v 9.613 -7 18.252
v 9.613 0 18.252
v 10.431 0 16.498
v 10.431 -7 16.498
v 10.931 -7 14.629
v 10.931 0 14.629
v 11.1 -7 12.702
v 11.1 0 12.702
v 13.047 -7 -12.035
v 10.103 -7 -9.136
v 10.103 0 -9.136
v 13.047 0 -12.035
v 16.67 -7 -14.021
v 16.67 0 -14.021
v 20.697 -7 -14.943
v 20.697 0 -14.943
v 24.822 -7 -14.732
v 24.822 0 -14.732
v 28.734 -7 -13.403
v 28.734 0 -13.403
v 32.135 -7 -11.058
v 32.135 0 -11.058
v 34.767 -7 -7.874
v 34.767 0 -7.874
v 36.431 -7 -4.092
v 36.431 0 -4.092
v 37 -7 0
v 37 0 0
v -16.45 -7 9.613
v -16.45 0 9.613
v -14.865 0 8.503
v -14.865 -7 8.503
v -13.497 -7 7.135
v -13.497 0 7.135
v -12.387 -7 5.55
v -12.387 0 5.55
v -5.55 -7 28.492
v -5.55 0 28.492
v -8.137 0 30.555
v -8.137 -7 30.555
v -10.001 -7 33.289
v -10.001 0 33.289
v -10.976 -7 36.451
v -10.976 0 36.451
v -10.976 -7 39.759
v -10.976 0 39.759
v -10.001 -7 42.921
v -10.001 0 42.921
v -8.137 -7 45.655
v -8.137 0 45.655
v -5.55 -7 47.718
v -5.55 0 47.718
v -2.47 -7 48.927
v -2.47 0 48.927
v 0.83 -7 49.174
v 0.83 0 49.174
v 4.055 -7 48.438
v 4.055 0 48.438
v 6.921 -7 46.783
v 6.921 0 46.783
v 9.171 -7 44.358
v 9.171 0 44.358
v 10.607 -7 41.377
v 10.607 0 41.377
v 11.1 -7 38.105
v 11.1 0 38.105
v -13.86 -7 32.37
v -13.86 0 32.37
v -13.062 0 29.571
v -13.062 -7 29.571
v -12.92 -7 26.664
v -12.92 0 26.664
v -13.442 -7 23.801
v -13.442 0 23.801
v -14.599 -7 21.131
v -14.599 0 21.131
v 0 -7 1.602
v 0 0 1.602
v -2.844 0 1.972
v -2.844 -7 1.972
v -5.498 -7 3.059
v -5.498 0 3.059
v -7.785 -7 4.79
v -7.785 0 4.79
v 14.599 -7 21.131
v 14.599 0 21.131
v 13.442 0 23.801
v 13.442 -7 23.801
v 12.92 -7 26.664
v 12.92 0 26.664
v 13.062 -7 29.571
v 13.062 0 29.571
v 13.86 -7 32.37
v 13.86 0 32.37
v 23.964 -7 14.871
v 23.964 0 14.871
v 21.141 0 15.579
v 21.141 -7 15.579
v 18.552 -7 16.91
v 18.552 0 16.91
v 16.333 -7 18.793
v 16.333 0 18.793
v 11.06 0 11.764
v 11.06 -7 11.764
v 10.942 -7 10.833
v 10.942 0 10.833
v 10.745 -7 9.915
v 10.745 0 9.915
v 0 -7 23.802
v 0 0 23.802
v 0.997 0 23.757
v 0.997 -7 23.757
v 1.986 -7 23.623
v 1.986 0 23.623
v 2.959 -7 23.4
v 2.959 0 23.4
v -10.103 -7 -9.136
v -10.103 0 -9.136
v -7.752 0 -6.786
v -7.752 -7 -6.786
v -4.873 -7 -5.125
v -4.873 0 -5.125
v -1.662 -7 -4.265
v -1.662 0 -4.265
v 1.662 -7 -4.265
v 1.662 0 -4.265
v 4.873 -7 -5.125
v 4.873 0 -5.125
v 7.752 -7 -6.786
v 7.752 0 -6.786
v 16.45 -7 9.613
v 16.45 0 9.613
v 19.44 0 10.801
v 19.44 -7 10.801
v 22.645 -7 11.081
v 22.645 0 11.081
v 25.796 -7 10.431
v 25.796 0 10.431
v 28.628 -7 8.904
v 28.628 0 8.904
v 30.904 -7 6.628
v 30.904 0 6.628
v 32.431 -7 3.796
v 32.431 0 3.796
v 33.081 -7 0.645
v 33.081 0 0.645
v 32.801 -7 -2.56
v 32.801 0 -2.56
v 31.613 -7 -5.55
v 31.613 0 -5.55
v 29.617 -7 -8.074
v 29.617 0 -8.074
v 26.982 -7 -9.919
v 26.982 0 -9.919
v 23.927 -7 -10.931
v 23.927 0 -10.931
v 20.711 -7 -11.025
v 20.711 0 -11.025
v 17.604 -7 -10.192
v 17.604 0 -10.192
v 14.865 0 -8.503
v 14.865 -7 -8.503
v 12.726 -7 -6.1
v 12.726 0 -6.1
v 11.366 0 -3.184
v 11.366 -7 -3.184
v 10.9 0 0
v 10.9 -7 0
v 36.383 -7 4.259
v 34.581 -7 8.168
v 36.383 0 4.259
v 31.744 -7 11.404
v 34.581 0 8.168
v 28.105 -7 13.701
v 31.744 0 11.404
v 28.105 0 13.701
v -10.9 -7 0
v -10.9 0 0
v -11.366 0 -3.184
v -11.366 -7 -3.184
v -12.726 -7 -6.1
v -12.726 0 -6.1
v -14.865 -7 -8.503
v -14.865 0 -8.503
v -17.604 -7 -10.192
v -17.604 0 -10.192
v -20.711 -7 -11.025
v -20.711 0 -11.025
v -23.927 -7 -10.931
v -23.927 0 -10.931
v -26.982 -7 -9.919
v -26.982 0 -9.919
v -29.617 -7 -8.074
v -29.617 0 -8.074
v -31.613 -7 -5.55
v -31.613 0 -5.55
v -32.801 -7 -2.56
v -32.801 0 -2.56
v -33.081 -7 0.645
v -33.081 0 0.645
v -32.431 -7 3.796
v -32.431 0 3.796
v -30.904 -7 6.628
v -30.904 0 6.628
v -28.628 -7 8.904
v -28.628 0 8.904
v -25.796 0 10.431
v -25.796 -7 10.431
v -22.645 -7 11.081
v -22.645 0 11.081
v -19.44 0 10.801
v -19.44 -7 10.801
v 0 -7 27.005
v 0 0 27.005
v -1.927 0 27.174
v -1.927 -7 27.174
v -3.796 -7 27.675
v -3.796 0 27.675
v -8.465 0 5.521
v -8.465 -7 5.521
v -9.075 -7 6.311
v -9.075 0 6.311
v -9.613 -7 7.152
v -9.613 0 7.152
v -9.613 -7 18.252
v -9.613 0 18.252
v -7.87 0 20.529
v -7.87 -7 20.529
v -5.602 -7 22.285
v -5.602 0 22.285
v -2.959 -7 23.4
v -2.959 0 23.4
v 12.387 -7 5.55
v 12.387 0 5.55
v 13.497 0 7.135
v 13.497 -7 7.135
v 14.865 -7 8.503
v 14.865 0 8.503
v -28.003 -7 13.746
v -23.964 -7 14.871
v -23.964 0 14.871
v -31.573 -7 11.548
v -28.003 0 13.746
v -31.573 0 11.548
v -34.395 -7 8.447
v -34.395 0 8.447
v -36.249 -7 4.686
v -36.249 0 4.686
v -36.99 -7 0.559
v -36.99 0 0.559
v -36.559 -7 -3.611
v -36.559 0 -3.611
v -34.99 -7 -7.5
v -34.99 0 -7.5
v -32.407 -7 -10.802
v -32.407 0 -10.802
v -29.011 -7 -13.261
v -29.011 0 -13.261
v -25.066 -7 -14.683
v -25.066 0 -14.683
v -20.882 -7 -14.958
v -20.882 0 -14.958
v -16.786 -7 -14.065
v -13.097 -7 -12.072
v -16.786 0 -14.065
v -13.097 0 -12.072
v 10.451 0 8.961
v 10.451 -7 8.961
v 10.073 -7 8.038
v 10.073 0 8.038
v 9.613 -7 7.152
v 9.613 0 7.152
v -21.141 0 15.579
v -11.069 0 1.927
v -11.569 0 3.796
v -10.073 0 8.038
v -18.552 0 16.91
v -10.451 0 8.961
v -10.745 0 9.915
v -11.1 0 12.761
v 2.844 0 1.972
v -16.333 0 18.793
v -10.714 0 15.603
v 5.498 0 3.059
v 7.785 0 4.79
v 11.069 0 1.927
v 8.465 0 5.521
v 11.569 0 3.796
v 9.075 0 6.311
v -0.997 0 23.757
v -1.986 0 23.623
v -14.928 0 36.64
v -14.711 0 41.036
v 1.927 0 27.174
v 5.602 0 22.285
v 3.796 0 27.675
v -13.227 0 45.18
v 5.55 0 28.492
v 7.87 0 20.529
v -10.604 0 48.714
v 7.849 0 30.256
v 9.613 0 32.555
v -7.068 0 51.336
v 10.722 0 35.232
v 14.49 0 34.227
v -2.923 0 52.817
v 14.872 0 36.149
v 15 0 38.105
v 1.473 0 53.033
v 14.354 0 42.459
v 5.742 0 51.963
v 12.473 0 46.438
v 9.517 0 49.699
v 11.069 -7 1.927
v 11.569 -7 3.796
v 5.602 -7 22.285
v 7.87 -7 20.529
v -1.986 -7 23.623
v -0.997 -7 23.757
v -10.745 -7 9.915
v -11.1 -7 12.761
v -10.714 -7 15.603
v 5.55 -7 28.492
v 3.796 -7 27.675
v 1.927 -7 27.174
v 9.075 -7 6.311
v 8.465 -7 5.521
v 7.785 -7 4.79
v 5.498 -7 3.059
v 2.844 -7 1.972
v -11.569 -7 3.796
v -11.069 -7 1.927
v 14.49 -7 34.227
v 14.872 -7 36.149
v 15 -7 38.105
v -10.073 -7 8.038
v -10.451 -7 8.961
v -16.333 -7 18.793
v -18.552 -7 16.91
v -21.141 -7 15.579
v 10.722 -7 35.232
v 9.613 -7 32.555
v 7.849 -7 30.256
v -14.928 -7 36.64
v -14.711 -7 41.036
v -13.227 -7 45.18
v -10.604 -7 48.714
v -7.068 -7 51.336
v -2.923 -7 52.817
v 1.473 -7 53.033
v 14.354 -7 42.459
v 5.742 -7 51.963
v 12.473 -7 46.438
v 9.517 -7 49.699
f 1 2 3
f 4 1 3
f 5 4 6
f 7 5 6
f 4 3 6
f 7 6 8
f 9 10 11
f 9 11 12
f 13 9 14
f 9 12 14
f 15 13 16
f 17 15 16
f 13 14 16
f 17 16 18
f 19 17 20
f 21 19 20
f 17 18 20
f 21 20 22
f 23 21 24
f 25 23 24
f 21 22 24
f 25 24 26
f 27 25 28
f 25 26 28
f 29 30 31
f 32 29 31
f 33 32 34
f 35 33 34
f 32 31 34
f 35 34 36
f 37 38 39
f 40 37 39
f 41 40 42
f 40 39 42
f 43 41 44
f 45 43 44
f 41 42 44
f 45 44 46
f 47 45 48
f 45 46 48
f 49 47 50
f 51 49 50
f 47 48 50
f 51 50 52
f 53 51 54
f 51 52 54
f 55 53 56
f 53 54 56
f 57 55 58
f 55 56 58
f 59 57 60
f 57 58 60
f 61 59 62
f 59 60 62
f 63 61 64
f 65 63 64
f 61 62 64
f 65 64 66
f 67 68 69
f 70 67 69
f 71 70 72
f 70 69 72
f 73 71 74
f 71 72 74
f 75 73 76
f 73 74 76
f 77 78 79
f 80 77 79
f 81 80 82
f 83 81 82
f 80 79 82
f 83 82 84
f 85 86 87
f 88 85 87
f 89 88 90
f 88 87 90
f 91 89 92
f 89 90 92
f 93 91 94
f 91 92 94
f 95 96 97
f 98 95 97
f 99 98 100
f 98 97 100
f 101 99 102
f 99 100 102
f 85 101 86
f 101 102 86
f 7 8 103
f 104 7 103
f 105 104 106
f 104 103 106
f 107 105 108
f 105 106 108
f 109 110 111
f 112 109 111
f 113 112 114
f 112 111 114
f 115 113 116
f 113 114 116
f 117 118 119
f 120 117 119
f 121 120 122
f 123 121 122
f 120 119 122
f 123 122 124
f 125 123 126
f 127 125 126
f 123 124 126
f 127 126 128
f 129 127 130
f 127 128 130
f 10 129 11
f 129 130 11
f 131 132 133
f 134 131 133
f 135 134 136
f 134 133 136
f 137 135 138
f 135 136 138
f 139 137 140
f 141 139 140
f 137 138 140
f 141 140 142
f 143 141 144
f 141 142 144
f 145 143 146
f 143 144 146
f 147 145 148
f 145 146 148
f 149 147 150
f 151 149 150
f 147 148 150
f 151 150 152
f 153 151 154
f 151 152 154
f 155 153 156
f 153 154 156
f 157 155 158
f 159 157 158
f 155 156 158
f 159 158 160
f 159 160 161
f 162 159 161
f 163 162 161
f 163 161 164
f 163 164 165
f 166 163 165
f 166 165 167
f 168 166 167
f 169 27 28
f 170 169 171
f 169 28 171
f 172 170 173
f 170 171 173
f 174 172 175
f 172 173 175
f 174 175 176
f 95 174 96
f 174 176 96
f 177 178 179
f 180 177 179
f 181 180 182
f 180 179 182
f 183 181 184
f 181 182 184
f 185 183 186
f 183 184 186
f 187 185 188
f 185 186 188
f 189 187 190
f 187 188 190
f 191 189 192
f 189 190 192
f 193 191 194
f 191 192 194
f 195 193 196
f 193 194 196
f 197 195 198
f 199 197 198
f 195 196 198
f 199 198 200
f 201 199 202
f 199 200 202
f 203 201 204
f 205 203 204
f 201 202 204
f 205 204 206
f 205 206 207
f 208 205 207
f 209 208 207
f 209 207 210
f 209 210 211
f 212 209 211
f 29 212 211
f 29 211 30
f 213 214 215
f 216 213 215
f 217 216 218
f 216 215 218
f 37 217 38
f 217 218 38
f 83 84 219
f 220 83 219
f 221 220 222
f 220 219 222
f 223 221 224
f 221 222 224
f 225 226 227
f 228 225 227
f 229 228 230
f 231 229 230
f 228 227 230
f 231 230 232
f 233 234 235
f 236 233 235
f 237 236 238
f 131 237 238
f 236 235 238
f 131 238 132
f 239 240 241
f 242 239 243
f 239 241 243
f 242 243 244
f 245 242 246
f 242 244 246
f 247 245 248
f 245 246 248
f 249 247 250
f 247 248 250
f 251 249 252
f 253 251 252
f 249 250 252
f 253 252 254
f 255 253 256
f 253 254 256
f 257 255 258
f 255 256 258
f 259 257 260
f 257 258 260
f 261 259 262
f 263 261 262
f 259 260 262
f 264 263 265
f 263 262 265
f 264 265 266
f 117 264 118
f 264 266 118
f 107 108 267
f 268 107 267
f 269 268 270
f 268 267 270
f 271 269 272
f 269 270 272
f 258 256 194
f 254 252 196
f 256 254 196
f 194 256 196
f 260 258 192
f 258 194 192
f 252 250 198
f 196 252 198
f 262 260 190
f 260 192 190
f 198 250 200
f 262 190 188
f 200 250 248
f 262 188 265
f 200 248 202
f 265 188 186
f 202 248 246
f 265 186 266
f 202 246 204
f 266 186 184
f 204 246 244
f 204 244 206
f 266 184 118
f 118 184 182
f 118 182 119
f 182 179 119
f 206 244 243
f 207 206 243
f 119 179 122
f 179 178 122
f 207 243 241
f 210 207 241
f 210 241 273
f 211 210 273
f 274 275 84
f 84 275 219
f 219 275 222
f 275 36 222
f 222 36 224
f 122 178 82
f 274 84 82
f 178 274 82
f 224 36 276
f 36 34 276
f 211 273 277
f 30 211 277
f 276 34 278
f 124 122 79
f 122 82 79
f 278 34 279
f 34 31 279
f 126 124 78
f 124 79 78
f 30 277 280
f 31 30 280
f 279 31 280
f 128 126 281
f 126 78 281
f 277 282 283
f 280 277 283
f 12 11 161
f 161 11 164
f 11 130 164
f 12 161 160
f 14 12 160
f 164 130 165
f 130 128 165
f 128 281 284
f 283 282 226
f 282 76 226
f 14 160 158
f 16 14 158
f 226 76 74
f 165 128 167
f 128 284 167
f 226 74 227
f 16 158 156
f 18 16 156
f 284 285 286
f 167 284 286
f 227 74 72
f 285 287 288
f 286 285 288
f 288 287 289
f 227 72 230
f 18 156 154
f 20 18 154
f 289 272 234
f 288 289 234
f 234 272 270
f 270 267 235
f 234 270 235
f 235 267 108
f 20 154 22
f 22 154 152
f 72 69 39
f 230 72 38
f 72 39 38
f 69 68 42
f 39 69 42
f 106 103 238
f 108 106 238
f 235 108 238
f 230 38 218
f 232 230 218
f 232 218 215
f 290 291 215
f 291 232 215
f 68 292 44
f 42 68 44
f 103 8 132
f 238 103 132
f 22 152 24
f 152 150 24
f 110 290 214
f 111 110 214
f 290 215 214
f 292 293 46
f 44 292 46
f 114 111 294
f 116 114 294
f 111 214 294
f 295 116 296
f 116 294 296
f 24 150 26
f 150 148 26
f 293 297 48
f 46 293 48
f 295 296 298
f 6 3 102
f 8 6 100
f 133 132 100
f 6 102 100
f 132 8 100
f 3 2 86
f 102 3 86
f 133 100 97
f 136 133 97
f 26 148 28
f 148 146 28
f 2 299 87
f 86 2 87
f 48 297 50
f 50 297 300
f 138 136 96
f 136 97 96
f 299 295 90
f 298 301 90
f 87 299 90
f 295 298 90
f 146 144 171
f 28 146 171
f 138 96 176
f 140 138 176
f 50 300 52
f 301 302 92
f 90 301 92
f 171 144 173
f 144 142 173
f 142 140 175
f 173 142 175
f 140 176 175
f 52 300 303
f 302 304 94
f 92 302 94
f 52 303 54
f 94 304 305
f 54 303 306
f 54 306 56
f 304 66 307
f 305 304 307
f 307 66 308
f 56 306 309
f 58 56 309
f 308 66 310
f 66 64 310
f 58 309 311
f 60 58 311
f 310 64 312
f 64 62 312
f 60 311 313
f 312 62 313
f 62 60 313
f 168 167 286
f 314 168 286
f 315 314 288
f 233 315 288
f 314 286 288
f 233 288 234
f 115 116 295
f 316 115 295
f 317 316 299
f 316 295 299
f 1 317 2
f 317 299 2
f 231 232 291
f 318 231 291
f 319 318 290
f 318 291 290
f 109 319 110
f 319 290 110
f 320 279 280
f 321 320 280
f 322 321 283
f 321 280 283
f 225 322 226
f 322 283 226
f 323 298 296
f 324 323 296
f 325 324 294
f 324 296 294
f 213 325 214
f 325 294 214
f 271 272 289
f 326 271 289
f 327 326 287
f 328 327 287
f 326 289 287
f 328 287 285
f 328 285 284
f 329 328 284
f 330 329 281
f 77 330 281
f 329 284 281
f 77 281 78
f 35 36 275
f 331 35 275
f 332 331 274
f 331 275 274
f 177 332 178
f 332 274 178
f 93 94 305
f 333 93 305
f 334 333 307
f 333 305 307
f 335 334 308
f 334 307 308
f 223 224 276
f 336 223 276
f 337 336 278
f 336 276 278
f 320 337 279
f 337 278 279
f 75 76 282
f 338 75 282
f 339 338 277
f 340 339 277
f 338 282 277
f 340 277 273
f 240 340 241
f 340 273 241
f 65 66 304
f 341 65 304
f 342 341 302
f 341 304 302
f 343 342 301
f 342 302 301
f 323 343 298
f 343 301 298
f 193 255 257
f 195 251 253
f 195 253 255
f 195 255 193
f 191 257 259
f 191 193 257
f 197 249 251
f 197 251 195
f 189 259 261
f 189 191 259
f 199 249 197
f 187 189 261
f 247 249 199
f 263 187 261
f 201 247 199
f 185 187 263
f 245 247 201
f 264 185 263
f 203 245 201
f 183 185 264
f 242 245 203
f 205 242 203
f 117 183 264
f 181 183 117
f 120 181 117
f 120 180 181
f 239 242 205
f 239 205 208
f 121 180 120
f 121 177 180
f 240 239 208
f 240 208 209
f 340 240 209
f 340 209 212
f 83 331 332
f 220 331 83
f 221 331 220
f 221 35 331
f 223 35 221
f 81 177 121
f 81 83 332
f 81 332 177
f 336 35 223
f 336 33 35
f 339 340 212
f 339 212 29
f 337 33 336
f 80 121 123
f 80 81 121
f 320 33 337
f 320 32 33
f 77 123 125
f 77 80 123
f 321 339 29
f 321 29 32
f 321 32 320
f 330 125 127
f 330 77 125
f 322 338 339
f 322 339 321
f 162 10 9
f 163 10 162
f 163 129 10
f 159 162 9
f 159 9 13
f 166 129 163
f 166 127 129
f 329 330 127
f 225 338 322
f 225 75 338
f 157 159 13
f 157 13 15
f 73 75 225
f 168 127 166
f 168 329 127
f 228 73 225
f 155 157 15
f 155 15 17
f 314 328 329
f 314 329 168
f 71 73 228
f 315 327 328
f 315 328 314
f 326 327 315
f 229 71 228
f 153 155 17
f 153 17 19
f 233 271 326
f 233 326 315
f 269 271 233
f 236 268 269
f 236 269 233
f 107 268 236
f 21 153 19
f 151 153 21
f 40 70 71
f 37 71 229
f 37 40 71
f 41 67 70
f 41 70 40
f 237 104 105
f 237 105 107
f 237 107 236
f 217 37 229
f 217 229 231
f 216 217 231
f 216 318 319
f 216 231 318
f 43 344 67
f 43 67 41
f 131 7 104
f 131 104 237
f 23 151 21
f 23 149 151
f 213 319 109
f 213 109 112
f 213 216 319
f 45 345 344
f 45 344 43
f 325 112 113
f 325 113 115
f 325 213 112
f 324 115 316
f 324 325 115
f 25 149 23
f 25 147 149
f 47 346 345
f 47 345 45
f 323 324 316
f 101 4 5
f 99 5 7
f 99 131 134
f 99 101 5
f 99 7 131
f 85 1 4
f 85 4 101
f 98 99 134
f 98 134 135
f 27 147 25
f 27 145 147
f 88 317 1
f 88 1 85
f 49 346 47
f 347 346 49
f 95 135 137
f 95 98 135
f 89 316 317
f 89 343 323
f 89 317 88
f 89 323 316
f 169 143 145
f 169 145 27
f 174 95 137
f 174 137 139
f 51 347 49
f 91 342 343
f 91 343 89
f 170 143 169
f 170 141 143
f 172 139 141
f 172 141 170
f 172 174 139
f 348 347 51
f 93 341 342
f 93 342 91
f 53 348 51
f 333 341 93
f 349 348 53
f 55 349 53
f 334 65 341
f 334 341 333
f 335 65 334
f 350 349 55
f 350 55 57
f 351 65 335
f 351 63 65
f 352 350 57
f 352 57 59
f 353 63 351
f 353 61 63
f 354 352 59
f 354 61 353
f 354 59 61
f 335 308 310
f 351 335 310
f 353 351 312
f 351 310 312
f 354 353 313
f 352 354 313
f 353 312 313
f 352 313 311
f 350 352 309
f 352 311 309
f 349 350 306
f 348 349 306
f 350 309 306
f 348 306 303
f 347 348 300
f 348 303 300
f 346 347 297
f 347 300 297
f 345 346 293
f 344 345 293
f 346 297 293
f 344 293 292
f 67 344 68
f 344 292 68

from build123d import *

# Parameters (mm, degrees)
F1_DEPTH = 7


with BuildPart() as f1:
    # F0 (on Front) → F1 (new body)
    with BuildSketch(Plane.XZ):
        with BuildLine():
            Line((-7, 0), (-10.9, 0))
            ThreePointArc((-10.9, 0), (-31.612881982, -5.55), (-16.45, 9.612881982))
            Line((-16.45, 9.612881982), (-14.5, 12.9903810568))
            ThreePointArc((-14.5, 12.9903810568), (-19.0765250841, 14.7123517636), (-23.9637150487, 14.8709052585))
            ThreePointArc((-23.9637150487, 14.8709052585), (-34.9903810568, -7.5), (-10.1032757932, -9.1360797472))
            ThreePointArc((-10.1032757932, -9.1360797472), (-7.7969921654, -4.8243723373), (-7, 0))
        make_face()
        with BuildLine():
            Line((0, 0), (-7, 0))
            ThreePointArc((-7, 0), (-7.7969921654, -4.8243723373), (-10.1032757932, -9.1360797472))
            ThreePointArc((-10.1032757932, -9.1360797472), (-5.6319588622, -5.4687614067), (0, -4.1561539699))
            Line((0, -4.1561539699), (0, 0))
        make_face()
        with BuildLine():
            ThreePointArc((-23.9637150487, 14.8709052585), (-19.0765250841, 14.7123517636), (-14.5, 12.9903810568))
            Line((-14.5, 12.9903810568), (-11, 19.0525588833))
            Line((-11, 19.0525588833), (-14.5993349199, 21.1306358682))
            ThreePointArc((-14.5993349199, 21.1306358682), (-18.5520657365, 16.9095201389), (-23.9637150487, 14.8709052585))
        make_face()
        with BuildLine():
            Line((7, 0), (0, 0))
            Line((0, 0), (0, -4.1561539699))
            ThreePointArc((0, -4.1561539699), (5.6319588622, -5.4687614067), (10.1032757932, -9.1360797472))
            ThreePointArc((10.1032757932, -9.1360797472), (7.7969921654, -4.8243723373), (7, 0))
        make_face()
        with BuildLine():
            Line((-14.5993349199, 21.1306358682), (-11, 19.0525588833))
            Line((-11, 19.0525588833), (-7.5, 25.1147367097))
            ThreePointArc((-7.5, 25.1147367097), (-11.2795329187, 28.2171383402), (-13.8604392555, 32.3702922552))
            ThreePointArc((-13.8604392555, 32.3702922552), (-12.9201068743, 26.6643590343), (-14.5993349199, 21.1306358682))
        make_face()
        with BuildLine():
            Line((10.9, 0), (7, 0))
            ThreePointArc((7, 0), (7.7969921654, -4.8243723373), (10.1032757932, -9.1360797472))
            ThreePointArc((10.1032757932, -9.1360797472), (26.8243723373, -14.2030078346), (37, 0))
            ThreePointArc((37, 0), (33.2795329187, 9.8879794263), (23.9637150487, 14.8709052585))
            ThreePointArc((23.9637150487, 14.8709052585), (19.0765250841, 14.7123517636), (14.5, 12.9903810568))
            Line((14.5, 12.9903810568), (16.45, 9.612881982))
            ThreePointArc((16.45, 9.612881982), (27.55, 9.612881982), (33.1, 0))
            ThreePointArc((33.1, 0), (22, -11.1), (10.9, 0))
        make_face()
        with BuildLine():
            ThreePointArc((-13.8604392555, 32.3702922552), (-11.2795329187, 28.2171383402), (-7.5, 25.1147367097))
            Line((-7.5, 25.1147367097), (-5.55, 28.4922357845))
            ThreePointArc((-5.55, 28.4922357845), (-5.55, 47.7179997485), (11.1, 38.1051177665))
            ThreePointArc((11.1, 38.1051177665), (9.612881982, 32.5551177665), (5.55, 28.4922357845))
            Line((5.55, 28.4922357845), (7.5, 25.1147367097))
            ThreePointArc((7.5, 25.1147367097), (11.2795329187, 28.2171383402), (13.8604392555, 32.3702922552))
            ThreePointArc((13.8604392555, 32.3702922552), (14.7123517636, 35.1816428506), (15, 38.1051177665))
            ThreePointArc((15, 38.1051177665), (-2.9234749159, 52.8174695301), (-13.8604392555, 32.3702922552))
        make_face()
        with BuildLine():
            Line((14.5993349199, 21.1306358682), (11, 19.0525588833))
            Line((11, 19.0525588833), (14.5, 12.9903810568))
            ThreePointArc((14.5, 12.9903810568), (19.0765250841, 14.7123517636), (23.9637150487, 14.8709052585))
            ThreePointArc((23.9637150487, 14.8709052585), (18.5520657365, 16.9095201389), (14.5993349199, 21.1306358682))
        make_face()
        with BuildLine():
            Line((7.5, 25.1147367097), (11, 19.0525588833))
            Line((11, 19.0525588833), (14.5993349199, 21.1306358682))
            ThreePointArc((14.5993349199, 21.1306358682), (12.9201068743, 26.6643590343), (13.8604392555, 32.3702922552))
            ThreePointArc((13.8604392555, 32.3702922552), (11.2795329187, 28.2171383402), (7.5, 25.1147367097))
        make_face()
        with BuildLine():
            Line((11, 19.0525588833), (9.612881982, 18.2517059222))
            ThreePointArc((9.612881982, 18.2517059222), (10.7217766718, 15.5745973228), (11.1, 12.7017059222))
            ThreePointArc((11.1, 12.7017059222), (11.0107964908, 11.2972983465), (10.7446197048, 9.9154633986))
            ThreePointArc((10.7446197048, 9.9154633986), (12.497113483, 11.6058238761), (14.5, 12.9903810568))
            Line((14.5, 12.9903810568), (11, 19.0525588833))
        make_face()
        with BuildLine():
            Line((9.612881982, 7.1517059222), (12.387118018, 5.55))
            ThreePointArc((12.387118018, 5.55), (14.1511147288, 7.8488852712), (16.45, 9.612881982))
            Line((16.45, 9.612881982), (14.5, 12.9903810568))
            ThreePointArc((14.5, 12.9903810568), (12.497113483, 11.6058238761), (10.7446197048, 9.9154633986))
            ThreePointArc((10.7446197048, 9.9154633986), (10.2721252708, 8.4953485406), (9.612881982, 7.1517059222))
        make_face()
        with BuildLine():
            ThreePointArc((7.7852666589, 4.7897135656), (7.1976184329, 2.426829195), (7, 0))
            Line((7, 0), (10.9, 0))
            ThreePointArc((10.9, 0), (11.2782233282, 2.8728914006), (12.387118018, 5.55))
            Line((12.387118018, 5.55), (9.612881982, 7.1517059222))
            ThreePointArc((9.612881982, 7.1517059222), (8.7788749852, 5.9089631776), (7.7852666589, 4.7897135656))
        make_face()
        with BuildLine():
            ThreePointArc((2.9593530459, 23.3999408023), (6.7927427446, 21.4805809074), (9.612881982, 18.2517059222))
            Line((9.612881982, 18.2517059222), (11, 19.0525588833))
            Line((11, 19.0525588833), (7.5, 25.1147367097))
            ThreePointArc((7.5, 25.1147367097), (5.2994950501, 24.0724646954), (2.9593530459, 23.3999408023))
        make_face()
        with BuildLine():
            ThreePointArc((5.55, 28.4922357845), (2.8728914006, 27.3833410947), (0, 27.0051177665))
            Line((0, 27.0051177665), (0, 23.8017059222))
            ThreePointArc((0, 23.8017059222), (1.4932502856, 23.7008060483), (2.9593530459, 23.3999408023))
            ThreePointArc((2.9593530459, 23.3999408023), (5.2994950501, 24.0724646954), (7.5, 25.1147367097))
            Line((7.5, 25.1147367097), (5.55, 28.4922357845))
        make_face()
        with BuildLine():
            Line((-5.55, 28.4922357845), (-7.5, 25.1147367097))
            ThreePointArc((-7.5, 25.1147367097), (-5.2994950501, 24.0724646954), (-2.9593530459, 23.3999408023))
            ThreePointArc((-2.9593530459, 23.3999408023), (-1.4932502856, 23.7008060483), (0, 23.8017059222))
            Line((0, 23.8017059222), (0, 27.0051177665))
            ThreePointArc((0, 27.0051177665), (-2.8728914006, 27.3833410947), (-5.55, 28.4922357845))
        make_face()
        with BuildLine():
            Line((-7.5, 25.1147367097), (-11, 19.0525588833))
            Line((-11, 19.0525588833), (-9.612881982, 18.2517059222))
            ThreePointArc((-9.612881982, 18.2517059222), (-6.7927427446, 21.4805809074), (-2.9593530459, 23.3999408023))
            ThreePointArc((-2.9593530459, 23.3999408023), (-5.2994950501, 24.0724646954), (-7.5, 25.1147367097))
        make_face()
        with BuildLine():
            Line((-11, 19.0525588833), (-14.5, 12.9903810568))
            ThreePointArc((-14.5, 12.9903810568), (-12.497113483, 11.6058238761), (-10.7446197048, 9.9154633986))
            ThreePointArc((-10.7446197048, 9.9154633986), (-10.9991001261, 14.1949562078), (-9.612881982, 18.2517059222))
            Line((-9.612881982, 18.2517059222), (-11, 19.0525588833))
        make_face()
        with BuildLine():
            Line((-14.5, 12.9903810568), (-16.45, 9.612881982))
            ThreePointArc((-16.45, 9.612881982), (-14.1511147288, 7.8488852712), (-12.387118018, 5.55))
            Line((-12.387118018, 5.55), (-9.612881982, 7.1517059222))
            ThreePointArc((-9.612881982, 7.1517059222), (-10.2721252708, 8.4953485406), (-10.7446197048, 9.9154633986))
            ThreePointArc((-10.7446197048, 9.9154633986), (-12.497113483, 11.6058238761), (-14.5, 12.9903810568))
        make_face()
        with BuildLine():
            ThreePointArc((-12.387118018, 5.55), (-11.2782233282, 2.8728914006), (-10.9, 0))
            Line((-10.9, 0), (-7, 0))
            ThreePointArc((-7, 0), (-7.1976184329, 2.426829195), (-7.7852666589, 4.7897135656))
            ThreePointArc((-7.7852666589, 4.7897135656), (-8.7788749852, 5.9089631776), (-9.612881982, 7.1517059222))
            Line((-9.612881982, 7.1517059222), (-12.387118018, 5.55))
        make_face()
        with BuildLine():
            Line((0, 1.6017059222), (0, 0))
            Line((0, 0), (7, 0))
            ThreePointArc((7, 0), (7.1976184329, 2.426829195), (7.7852666589, 4.7897135656))
            ThreePointArc((7.7852666589, 4.7897135656), (4.2063573815, 2.4295806514), (0, 1.6017059222))
        make_face()
        with BuildLine():
            ThreePointArc((-7.7852666589, 4.7897135656), (-7.1976184329, 2.426829195), (-7, 0))
            Line((-7, 0), (0, 0))
            Line((0, 0), (0, 1.6017059222))
            ThreePointArc((0, 1.6017059222), (-4.2063573815, 2.4295806514), (-7.7852666589, 4.7897135656))
        make_face()
    extrude(amount=F1_DEPTH)


solid = f1.part
